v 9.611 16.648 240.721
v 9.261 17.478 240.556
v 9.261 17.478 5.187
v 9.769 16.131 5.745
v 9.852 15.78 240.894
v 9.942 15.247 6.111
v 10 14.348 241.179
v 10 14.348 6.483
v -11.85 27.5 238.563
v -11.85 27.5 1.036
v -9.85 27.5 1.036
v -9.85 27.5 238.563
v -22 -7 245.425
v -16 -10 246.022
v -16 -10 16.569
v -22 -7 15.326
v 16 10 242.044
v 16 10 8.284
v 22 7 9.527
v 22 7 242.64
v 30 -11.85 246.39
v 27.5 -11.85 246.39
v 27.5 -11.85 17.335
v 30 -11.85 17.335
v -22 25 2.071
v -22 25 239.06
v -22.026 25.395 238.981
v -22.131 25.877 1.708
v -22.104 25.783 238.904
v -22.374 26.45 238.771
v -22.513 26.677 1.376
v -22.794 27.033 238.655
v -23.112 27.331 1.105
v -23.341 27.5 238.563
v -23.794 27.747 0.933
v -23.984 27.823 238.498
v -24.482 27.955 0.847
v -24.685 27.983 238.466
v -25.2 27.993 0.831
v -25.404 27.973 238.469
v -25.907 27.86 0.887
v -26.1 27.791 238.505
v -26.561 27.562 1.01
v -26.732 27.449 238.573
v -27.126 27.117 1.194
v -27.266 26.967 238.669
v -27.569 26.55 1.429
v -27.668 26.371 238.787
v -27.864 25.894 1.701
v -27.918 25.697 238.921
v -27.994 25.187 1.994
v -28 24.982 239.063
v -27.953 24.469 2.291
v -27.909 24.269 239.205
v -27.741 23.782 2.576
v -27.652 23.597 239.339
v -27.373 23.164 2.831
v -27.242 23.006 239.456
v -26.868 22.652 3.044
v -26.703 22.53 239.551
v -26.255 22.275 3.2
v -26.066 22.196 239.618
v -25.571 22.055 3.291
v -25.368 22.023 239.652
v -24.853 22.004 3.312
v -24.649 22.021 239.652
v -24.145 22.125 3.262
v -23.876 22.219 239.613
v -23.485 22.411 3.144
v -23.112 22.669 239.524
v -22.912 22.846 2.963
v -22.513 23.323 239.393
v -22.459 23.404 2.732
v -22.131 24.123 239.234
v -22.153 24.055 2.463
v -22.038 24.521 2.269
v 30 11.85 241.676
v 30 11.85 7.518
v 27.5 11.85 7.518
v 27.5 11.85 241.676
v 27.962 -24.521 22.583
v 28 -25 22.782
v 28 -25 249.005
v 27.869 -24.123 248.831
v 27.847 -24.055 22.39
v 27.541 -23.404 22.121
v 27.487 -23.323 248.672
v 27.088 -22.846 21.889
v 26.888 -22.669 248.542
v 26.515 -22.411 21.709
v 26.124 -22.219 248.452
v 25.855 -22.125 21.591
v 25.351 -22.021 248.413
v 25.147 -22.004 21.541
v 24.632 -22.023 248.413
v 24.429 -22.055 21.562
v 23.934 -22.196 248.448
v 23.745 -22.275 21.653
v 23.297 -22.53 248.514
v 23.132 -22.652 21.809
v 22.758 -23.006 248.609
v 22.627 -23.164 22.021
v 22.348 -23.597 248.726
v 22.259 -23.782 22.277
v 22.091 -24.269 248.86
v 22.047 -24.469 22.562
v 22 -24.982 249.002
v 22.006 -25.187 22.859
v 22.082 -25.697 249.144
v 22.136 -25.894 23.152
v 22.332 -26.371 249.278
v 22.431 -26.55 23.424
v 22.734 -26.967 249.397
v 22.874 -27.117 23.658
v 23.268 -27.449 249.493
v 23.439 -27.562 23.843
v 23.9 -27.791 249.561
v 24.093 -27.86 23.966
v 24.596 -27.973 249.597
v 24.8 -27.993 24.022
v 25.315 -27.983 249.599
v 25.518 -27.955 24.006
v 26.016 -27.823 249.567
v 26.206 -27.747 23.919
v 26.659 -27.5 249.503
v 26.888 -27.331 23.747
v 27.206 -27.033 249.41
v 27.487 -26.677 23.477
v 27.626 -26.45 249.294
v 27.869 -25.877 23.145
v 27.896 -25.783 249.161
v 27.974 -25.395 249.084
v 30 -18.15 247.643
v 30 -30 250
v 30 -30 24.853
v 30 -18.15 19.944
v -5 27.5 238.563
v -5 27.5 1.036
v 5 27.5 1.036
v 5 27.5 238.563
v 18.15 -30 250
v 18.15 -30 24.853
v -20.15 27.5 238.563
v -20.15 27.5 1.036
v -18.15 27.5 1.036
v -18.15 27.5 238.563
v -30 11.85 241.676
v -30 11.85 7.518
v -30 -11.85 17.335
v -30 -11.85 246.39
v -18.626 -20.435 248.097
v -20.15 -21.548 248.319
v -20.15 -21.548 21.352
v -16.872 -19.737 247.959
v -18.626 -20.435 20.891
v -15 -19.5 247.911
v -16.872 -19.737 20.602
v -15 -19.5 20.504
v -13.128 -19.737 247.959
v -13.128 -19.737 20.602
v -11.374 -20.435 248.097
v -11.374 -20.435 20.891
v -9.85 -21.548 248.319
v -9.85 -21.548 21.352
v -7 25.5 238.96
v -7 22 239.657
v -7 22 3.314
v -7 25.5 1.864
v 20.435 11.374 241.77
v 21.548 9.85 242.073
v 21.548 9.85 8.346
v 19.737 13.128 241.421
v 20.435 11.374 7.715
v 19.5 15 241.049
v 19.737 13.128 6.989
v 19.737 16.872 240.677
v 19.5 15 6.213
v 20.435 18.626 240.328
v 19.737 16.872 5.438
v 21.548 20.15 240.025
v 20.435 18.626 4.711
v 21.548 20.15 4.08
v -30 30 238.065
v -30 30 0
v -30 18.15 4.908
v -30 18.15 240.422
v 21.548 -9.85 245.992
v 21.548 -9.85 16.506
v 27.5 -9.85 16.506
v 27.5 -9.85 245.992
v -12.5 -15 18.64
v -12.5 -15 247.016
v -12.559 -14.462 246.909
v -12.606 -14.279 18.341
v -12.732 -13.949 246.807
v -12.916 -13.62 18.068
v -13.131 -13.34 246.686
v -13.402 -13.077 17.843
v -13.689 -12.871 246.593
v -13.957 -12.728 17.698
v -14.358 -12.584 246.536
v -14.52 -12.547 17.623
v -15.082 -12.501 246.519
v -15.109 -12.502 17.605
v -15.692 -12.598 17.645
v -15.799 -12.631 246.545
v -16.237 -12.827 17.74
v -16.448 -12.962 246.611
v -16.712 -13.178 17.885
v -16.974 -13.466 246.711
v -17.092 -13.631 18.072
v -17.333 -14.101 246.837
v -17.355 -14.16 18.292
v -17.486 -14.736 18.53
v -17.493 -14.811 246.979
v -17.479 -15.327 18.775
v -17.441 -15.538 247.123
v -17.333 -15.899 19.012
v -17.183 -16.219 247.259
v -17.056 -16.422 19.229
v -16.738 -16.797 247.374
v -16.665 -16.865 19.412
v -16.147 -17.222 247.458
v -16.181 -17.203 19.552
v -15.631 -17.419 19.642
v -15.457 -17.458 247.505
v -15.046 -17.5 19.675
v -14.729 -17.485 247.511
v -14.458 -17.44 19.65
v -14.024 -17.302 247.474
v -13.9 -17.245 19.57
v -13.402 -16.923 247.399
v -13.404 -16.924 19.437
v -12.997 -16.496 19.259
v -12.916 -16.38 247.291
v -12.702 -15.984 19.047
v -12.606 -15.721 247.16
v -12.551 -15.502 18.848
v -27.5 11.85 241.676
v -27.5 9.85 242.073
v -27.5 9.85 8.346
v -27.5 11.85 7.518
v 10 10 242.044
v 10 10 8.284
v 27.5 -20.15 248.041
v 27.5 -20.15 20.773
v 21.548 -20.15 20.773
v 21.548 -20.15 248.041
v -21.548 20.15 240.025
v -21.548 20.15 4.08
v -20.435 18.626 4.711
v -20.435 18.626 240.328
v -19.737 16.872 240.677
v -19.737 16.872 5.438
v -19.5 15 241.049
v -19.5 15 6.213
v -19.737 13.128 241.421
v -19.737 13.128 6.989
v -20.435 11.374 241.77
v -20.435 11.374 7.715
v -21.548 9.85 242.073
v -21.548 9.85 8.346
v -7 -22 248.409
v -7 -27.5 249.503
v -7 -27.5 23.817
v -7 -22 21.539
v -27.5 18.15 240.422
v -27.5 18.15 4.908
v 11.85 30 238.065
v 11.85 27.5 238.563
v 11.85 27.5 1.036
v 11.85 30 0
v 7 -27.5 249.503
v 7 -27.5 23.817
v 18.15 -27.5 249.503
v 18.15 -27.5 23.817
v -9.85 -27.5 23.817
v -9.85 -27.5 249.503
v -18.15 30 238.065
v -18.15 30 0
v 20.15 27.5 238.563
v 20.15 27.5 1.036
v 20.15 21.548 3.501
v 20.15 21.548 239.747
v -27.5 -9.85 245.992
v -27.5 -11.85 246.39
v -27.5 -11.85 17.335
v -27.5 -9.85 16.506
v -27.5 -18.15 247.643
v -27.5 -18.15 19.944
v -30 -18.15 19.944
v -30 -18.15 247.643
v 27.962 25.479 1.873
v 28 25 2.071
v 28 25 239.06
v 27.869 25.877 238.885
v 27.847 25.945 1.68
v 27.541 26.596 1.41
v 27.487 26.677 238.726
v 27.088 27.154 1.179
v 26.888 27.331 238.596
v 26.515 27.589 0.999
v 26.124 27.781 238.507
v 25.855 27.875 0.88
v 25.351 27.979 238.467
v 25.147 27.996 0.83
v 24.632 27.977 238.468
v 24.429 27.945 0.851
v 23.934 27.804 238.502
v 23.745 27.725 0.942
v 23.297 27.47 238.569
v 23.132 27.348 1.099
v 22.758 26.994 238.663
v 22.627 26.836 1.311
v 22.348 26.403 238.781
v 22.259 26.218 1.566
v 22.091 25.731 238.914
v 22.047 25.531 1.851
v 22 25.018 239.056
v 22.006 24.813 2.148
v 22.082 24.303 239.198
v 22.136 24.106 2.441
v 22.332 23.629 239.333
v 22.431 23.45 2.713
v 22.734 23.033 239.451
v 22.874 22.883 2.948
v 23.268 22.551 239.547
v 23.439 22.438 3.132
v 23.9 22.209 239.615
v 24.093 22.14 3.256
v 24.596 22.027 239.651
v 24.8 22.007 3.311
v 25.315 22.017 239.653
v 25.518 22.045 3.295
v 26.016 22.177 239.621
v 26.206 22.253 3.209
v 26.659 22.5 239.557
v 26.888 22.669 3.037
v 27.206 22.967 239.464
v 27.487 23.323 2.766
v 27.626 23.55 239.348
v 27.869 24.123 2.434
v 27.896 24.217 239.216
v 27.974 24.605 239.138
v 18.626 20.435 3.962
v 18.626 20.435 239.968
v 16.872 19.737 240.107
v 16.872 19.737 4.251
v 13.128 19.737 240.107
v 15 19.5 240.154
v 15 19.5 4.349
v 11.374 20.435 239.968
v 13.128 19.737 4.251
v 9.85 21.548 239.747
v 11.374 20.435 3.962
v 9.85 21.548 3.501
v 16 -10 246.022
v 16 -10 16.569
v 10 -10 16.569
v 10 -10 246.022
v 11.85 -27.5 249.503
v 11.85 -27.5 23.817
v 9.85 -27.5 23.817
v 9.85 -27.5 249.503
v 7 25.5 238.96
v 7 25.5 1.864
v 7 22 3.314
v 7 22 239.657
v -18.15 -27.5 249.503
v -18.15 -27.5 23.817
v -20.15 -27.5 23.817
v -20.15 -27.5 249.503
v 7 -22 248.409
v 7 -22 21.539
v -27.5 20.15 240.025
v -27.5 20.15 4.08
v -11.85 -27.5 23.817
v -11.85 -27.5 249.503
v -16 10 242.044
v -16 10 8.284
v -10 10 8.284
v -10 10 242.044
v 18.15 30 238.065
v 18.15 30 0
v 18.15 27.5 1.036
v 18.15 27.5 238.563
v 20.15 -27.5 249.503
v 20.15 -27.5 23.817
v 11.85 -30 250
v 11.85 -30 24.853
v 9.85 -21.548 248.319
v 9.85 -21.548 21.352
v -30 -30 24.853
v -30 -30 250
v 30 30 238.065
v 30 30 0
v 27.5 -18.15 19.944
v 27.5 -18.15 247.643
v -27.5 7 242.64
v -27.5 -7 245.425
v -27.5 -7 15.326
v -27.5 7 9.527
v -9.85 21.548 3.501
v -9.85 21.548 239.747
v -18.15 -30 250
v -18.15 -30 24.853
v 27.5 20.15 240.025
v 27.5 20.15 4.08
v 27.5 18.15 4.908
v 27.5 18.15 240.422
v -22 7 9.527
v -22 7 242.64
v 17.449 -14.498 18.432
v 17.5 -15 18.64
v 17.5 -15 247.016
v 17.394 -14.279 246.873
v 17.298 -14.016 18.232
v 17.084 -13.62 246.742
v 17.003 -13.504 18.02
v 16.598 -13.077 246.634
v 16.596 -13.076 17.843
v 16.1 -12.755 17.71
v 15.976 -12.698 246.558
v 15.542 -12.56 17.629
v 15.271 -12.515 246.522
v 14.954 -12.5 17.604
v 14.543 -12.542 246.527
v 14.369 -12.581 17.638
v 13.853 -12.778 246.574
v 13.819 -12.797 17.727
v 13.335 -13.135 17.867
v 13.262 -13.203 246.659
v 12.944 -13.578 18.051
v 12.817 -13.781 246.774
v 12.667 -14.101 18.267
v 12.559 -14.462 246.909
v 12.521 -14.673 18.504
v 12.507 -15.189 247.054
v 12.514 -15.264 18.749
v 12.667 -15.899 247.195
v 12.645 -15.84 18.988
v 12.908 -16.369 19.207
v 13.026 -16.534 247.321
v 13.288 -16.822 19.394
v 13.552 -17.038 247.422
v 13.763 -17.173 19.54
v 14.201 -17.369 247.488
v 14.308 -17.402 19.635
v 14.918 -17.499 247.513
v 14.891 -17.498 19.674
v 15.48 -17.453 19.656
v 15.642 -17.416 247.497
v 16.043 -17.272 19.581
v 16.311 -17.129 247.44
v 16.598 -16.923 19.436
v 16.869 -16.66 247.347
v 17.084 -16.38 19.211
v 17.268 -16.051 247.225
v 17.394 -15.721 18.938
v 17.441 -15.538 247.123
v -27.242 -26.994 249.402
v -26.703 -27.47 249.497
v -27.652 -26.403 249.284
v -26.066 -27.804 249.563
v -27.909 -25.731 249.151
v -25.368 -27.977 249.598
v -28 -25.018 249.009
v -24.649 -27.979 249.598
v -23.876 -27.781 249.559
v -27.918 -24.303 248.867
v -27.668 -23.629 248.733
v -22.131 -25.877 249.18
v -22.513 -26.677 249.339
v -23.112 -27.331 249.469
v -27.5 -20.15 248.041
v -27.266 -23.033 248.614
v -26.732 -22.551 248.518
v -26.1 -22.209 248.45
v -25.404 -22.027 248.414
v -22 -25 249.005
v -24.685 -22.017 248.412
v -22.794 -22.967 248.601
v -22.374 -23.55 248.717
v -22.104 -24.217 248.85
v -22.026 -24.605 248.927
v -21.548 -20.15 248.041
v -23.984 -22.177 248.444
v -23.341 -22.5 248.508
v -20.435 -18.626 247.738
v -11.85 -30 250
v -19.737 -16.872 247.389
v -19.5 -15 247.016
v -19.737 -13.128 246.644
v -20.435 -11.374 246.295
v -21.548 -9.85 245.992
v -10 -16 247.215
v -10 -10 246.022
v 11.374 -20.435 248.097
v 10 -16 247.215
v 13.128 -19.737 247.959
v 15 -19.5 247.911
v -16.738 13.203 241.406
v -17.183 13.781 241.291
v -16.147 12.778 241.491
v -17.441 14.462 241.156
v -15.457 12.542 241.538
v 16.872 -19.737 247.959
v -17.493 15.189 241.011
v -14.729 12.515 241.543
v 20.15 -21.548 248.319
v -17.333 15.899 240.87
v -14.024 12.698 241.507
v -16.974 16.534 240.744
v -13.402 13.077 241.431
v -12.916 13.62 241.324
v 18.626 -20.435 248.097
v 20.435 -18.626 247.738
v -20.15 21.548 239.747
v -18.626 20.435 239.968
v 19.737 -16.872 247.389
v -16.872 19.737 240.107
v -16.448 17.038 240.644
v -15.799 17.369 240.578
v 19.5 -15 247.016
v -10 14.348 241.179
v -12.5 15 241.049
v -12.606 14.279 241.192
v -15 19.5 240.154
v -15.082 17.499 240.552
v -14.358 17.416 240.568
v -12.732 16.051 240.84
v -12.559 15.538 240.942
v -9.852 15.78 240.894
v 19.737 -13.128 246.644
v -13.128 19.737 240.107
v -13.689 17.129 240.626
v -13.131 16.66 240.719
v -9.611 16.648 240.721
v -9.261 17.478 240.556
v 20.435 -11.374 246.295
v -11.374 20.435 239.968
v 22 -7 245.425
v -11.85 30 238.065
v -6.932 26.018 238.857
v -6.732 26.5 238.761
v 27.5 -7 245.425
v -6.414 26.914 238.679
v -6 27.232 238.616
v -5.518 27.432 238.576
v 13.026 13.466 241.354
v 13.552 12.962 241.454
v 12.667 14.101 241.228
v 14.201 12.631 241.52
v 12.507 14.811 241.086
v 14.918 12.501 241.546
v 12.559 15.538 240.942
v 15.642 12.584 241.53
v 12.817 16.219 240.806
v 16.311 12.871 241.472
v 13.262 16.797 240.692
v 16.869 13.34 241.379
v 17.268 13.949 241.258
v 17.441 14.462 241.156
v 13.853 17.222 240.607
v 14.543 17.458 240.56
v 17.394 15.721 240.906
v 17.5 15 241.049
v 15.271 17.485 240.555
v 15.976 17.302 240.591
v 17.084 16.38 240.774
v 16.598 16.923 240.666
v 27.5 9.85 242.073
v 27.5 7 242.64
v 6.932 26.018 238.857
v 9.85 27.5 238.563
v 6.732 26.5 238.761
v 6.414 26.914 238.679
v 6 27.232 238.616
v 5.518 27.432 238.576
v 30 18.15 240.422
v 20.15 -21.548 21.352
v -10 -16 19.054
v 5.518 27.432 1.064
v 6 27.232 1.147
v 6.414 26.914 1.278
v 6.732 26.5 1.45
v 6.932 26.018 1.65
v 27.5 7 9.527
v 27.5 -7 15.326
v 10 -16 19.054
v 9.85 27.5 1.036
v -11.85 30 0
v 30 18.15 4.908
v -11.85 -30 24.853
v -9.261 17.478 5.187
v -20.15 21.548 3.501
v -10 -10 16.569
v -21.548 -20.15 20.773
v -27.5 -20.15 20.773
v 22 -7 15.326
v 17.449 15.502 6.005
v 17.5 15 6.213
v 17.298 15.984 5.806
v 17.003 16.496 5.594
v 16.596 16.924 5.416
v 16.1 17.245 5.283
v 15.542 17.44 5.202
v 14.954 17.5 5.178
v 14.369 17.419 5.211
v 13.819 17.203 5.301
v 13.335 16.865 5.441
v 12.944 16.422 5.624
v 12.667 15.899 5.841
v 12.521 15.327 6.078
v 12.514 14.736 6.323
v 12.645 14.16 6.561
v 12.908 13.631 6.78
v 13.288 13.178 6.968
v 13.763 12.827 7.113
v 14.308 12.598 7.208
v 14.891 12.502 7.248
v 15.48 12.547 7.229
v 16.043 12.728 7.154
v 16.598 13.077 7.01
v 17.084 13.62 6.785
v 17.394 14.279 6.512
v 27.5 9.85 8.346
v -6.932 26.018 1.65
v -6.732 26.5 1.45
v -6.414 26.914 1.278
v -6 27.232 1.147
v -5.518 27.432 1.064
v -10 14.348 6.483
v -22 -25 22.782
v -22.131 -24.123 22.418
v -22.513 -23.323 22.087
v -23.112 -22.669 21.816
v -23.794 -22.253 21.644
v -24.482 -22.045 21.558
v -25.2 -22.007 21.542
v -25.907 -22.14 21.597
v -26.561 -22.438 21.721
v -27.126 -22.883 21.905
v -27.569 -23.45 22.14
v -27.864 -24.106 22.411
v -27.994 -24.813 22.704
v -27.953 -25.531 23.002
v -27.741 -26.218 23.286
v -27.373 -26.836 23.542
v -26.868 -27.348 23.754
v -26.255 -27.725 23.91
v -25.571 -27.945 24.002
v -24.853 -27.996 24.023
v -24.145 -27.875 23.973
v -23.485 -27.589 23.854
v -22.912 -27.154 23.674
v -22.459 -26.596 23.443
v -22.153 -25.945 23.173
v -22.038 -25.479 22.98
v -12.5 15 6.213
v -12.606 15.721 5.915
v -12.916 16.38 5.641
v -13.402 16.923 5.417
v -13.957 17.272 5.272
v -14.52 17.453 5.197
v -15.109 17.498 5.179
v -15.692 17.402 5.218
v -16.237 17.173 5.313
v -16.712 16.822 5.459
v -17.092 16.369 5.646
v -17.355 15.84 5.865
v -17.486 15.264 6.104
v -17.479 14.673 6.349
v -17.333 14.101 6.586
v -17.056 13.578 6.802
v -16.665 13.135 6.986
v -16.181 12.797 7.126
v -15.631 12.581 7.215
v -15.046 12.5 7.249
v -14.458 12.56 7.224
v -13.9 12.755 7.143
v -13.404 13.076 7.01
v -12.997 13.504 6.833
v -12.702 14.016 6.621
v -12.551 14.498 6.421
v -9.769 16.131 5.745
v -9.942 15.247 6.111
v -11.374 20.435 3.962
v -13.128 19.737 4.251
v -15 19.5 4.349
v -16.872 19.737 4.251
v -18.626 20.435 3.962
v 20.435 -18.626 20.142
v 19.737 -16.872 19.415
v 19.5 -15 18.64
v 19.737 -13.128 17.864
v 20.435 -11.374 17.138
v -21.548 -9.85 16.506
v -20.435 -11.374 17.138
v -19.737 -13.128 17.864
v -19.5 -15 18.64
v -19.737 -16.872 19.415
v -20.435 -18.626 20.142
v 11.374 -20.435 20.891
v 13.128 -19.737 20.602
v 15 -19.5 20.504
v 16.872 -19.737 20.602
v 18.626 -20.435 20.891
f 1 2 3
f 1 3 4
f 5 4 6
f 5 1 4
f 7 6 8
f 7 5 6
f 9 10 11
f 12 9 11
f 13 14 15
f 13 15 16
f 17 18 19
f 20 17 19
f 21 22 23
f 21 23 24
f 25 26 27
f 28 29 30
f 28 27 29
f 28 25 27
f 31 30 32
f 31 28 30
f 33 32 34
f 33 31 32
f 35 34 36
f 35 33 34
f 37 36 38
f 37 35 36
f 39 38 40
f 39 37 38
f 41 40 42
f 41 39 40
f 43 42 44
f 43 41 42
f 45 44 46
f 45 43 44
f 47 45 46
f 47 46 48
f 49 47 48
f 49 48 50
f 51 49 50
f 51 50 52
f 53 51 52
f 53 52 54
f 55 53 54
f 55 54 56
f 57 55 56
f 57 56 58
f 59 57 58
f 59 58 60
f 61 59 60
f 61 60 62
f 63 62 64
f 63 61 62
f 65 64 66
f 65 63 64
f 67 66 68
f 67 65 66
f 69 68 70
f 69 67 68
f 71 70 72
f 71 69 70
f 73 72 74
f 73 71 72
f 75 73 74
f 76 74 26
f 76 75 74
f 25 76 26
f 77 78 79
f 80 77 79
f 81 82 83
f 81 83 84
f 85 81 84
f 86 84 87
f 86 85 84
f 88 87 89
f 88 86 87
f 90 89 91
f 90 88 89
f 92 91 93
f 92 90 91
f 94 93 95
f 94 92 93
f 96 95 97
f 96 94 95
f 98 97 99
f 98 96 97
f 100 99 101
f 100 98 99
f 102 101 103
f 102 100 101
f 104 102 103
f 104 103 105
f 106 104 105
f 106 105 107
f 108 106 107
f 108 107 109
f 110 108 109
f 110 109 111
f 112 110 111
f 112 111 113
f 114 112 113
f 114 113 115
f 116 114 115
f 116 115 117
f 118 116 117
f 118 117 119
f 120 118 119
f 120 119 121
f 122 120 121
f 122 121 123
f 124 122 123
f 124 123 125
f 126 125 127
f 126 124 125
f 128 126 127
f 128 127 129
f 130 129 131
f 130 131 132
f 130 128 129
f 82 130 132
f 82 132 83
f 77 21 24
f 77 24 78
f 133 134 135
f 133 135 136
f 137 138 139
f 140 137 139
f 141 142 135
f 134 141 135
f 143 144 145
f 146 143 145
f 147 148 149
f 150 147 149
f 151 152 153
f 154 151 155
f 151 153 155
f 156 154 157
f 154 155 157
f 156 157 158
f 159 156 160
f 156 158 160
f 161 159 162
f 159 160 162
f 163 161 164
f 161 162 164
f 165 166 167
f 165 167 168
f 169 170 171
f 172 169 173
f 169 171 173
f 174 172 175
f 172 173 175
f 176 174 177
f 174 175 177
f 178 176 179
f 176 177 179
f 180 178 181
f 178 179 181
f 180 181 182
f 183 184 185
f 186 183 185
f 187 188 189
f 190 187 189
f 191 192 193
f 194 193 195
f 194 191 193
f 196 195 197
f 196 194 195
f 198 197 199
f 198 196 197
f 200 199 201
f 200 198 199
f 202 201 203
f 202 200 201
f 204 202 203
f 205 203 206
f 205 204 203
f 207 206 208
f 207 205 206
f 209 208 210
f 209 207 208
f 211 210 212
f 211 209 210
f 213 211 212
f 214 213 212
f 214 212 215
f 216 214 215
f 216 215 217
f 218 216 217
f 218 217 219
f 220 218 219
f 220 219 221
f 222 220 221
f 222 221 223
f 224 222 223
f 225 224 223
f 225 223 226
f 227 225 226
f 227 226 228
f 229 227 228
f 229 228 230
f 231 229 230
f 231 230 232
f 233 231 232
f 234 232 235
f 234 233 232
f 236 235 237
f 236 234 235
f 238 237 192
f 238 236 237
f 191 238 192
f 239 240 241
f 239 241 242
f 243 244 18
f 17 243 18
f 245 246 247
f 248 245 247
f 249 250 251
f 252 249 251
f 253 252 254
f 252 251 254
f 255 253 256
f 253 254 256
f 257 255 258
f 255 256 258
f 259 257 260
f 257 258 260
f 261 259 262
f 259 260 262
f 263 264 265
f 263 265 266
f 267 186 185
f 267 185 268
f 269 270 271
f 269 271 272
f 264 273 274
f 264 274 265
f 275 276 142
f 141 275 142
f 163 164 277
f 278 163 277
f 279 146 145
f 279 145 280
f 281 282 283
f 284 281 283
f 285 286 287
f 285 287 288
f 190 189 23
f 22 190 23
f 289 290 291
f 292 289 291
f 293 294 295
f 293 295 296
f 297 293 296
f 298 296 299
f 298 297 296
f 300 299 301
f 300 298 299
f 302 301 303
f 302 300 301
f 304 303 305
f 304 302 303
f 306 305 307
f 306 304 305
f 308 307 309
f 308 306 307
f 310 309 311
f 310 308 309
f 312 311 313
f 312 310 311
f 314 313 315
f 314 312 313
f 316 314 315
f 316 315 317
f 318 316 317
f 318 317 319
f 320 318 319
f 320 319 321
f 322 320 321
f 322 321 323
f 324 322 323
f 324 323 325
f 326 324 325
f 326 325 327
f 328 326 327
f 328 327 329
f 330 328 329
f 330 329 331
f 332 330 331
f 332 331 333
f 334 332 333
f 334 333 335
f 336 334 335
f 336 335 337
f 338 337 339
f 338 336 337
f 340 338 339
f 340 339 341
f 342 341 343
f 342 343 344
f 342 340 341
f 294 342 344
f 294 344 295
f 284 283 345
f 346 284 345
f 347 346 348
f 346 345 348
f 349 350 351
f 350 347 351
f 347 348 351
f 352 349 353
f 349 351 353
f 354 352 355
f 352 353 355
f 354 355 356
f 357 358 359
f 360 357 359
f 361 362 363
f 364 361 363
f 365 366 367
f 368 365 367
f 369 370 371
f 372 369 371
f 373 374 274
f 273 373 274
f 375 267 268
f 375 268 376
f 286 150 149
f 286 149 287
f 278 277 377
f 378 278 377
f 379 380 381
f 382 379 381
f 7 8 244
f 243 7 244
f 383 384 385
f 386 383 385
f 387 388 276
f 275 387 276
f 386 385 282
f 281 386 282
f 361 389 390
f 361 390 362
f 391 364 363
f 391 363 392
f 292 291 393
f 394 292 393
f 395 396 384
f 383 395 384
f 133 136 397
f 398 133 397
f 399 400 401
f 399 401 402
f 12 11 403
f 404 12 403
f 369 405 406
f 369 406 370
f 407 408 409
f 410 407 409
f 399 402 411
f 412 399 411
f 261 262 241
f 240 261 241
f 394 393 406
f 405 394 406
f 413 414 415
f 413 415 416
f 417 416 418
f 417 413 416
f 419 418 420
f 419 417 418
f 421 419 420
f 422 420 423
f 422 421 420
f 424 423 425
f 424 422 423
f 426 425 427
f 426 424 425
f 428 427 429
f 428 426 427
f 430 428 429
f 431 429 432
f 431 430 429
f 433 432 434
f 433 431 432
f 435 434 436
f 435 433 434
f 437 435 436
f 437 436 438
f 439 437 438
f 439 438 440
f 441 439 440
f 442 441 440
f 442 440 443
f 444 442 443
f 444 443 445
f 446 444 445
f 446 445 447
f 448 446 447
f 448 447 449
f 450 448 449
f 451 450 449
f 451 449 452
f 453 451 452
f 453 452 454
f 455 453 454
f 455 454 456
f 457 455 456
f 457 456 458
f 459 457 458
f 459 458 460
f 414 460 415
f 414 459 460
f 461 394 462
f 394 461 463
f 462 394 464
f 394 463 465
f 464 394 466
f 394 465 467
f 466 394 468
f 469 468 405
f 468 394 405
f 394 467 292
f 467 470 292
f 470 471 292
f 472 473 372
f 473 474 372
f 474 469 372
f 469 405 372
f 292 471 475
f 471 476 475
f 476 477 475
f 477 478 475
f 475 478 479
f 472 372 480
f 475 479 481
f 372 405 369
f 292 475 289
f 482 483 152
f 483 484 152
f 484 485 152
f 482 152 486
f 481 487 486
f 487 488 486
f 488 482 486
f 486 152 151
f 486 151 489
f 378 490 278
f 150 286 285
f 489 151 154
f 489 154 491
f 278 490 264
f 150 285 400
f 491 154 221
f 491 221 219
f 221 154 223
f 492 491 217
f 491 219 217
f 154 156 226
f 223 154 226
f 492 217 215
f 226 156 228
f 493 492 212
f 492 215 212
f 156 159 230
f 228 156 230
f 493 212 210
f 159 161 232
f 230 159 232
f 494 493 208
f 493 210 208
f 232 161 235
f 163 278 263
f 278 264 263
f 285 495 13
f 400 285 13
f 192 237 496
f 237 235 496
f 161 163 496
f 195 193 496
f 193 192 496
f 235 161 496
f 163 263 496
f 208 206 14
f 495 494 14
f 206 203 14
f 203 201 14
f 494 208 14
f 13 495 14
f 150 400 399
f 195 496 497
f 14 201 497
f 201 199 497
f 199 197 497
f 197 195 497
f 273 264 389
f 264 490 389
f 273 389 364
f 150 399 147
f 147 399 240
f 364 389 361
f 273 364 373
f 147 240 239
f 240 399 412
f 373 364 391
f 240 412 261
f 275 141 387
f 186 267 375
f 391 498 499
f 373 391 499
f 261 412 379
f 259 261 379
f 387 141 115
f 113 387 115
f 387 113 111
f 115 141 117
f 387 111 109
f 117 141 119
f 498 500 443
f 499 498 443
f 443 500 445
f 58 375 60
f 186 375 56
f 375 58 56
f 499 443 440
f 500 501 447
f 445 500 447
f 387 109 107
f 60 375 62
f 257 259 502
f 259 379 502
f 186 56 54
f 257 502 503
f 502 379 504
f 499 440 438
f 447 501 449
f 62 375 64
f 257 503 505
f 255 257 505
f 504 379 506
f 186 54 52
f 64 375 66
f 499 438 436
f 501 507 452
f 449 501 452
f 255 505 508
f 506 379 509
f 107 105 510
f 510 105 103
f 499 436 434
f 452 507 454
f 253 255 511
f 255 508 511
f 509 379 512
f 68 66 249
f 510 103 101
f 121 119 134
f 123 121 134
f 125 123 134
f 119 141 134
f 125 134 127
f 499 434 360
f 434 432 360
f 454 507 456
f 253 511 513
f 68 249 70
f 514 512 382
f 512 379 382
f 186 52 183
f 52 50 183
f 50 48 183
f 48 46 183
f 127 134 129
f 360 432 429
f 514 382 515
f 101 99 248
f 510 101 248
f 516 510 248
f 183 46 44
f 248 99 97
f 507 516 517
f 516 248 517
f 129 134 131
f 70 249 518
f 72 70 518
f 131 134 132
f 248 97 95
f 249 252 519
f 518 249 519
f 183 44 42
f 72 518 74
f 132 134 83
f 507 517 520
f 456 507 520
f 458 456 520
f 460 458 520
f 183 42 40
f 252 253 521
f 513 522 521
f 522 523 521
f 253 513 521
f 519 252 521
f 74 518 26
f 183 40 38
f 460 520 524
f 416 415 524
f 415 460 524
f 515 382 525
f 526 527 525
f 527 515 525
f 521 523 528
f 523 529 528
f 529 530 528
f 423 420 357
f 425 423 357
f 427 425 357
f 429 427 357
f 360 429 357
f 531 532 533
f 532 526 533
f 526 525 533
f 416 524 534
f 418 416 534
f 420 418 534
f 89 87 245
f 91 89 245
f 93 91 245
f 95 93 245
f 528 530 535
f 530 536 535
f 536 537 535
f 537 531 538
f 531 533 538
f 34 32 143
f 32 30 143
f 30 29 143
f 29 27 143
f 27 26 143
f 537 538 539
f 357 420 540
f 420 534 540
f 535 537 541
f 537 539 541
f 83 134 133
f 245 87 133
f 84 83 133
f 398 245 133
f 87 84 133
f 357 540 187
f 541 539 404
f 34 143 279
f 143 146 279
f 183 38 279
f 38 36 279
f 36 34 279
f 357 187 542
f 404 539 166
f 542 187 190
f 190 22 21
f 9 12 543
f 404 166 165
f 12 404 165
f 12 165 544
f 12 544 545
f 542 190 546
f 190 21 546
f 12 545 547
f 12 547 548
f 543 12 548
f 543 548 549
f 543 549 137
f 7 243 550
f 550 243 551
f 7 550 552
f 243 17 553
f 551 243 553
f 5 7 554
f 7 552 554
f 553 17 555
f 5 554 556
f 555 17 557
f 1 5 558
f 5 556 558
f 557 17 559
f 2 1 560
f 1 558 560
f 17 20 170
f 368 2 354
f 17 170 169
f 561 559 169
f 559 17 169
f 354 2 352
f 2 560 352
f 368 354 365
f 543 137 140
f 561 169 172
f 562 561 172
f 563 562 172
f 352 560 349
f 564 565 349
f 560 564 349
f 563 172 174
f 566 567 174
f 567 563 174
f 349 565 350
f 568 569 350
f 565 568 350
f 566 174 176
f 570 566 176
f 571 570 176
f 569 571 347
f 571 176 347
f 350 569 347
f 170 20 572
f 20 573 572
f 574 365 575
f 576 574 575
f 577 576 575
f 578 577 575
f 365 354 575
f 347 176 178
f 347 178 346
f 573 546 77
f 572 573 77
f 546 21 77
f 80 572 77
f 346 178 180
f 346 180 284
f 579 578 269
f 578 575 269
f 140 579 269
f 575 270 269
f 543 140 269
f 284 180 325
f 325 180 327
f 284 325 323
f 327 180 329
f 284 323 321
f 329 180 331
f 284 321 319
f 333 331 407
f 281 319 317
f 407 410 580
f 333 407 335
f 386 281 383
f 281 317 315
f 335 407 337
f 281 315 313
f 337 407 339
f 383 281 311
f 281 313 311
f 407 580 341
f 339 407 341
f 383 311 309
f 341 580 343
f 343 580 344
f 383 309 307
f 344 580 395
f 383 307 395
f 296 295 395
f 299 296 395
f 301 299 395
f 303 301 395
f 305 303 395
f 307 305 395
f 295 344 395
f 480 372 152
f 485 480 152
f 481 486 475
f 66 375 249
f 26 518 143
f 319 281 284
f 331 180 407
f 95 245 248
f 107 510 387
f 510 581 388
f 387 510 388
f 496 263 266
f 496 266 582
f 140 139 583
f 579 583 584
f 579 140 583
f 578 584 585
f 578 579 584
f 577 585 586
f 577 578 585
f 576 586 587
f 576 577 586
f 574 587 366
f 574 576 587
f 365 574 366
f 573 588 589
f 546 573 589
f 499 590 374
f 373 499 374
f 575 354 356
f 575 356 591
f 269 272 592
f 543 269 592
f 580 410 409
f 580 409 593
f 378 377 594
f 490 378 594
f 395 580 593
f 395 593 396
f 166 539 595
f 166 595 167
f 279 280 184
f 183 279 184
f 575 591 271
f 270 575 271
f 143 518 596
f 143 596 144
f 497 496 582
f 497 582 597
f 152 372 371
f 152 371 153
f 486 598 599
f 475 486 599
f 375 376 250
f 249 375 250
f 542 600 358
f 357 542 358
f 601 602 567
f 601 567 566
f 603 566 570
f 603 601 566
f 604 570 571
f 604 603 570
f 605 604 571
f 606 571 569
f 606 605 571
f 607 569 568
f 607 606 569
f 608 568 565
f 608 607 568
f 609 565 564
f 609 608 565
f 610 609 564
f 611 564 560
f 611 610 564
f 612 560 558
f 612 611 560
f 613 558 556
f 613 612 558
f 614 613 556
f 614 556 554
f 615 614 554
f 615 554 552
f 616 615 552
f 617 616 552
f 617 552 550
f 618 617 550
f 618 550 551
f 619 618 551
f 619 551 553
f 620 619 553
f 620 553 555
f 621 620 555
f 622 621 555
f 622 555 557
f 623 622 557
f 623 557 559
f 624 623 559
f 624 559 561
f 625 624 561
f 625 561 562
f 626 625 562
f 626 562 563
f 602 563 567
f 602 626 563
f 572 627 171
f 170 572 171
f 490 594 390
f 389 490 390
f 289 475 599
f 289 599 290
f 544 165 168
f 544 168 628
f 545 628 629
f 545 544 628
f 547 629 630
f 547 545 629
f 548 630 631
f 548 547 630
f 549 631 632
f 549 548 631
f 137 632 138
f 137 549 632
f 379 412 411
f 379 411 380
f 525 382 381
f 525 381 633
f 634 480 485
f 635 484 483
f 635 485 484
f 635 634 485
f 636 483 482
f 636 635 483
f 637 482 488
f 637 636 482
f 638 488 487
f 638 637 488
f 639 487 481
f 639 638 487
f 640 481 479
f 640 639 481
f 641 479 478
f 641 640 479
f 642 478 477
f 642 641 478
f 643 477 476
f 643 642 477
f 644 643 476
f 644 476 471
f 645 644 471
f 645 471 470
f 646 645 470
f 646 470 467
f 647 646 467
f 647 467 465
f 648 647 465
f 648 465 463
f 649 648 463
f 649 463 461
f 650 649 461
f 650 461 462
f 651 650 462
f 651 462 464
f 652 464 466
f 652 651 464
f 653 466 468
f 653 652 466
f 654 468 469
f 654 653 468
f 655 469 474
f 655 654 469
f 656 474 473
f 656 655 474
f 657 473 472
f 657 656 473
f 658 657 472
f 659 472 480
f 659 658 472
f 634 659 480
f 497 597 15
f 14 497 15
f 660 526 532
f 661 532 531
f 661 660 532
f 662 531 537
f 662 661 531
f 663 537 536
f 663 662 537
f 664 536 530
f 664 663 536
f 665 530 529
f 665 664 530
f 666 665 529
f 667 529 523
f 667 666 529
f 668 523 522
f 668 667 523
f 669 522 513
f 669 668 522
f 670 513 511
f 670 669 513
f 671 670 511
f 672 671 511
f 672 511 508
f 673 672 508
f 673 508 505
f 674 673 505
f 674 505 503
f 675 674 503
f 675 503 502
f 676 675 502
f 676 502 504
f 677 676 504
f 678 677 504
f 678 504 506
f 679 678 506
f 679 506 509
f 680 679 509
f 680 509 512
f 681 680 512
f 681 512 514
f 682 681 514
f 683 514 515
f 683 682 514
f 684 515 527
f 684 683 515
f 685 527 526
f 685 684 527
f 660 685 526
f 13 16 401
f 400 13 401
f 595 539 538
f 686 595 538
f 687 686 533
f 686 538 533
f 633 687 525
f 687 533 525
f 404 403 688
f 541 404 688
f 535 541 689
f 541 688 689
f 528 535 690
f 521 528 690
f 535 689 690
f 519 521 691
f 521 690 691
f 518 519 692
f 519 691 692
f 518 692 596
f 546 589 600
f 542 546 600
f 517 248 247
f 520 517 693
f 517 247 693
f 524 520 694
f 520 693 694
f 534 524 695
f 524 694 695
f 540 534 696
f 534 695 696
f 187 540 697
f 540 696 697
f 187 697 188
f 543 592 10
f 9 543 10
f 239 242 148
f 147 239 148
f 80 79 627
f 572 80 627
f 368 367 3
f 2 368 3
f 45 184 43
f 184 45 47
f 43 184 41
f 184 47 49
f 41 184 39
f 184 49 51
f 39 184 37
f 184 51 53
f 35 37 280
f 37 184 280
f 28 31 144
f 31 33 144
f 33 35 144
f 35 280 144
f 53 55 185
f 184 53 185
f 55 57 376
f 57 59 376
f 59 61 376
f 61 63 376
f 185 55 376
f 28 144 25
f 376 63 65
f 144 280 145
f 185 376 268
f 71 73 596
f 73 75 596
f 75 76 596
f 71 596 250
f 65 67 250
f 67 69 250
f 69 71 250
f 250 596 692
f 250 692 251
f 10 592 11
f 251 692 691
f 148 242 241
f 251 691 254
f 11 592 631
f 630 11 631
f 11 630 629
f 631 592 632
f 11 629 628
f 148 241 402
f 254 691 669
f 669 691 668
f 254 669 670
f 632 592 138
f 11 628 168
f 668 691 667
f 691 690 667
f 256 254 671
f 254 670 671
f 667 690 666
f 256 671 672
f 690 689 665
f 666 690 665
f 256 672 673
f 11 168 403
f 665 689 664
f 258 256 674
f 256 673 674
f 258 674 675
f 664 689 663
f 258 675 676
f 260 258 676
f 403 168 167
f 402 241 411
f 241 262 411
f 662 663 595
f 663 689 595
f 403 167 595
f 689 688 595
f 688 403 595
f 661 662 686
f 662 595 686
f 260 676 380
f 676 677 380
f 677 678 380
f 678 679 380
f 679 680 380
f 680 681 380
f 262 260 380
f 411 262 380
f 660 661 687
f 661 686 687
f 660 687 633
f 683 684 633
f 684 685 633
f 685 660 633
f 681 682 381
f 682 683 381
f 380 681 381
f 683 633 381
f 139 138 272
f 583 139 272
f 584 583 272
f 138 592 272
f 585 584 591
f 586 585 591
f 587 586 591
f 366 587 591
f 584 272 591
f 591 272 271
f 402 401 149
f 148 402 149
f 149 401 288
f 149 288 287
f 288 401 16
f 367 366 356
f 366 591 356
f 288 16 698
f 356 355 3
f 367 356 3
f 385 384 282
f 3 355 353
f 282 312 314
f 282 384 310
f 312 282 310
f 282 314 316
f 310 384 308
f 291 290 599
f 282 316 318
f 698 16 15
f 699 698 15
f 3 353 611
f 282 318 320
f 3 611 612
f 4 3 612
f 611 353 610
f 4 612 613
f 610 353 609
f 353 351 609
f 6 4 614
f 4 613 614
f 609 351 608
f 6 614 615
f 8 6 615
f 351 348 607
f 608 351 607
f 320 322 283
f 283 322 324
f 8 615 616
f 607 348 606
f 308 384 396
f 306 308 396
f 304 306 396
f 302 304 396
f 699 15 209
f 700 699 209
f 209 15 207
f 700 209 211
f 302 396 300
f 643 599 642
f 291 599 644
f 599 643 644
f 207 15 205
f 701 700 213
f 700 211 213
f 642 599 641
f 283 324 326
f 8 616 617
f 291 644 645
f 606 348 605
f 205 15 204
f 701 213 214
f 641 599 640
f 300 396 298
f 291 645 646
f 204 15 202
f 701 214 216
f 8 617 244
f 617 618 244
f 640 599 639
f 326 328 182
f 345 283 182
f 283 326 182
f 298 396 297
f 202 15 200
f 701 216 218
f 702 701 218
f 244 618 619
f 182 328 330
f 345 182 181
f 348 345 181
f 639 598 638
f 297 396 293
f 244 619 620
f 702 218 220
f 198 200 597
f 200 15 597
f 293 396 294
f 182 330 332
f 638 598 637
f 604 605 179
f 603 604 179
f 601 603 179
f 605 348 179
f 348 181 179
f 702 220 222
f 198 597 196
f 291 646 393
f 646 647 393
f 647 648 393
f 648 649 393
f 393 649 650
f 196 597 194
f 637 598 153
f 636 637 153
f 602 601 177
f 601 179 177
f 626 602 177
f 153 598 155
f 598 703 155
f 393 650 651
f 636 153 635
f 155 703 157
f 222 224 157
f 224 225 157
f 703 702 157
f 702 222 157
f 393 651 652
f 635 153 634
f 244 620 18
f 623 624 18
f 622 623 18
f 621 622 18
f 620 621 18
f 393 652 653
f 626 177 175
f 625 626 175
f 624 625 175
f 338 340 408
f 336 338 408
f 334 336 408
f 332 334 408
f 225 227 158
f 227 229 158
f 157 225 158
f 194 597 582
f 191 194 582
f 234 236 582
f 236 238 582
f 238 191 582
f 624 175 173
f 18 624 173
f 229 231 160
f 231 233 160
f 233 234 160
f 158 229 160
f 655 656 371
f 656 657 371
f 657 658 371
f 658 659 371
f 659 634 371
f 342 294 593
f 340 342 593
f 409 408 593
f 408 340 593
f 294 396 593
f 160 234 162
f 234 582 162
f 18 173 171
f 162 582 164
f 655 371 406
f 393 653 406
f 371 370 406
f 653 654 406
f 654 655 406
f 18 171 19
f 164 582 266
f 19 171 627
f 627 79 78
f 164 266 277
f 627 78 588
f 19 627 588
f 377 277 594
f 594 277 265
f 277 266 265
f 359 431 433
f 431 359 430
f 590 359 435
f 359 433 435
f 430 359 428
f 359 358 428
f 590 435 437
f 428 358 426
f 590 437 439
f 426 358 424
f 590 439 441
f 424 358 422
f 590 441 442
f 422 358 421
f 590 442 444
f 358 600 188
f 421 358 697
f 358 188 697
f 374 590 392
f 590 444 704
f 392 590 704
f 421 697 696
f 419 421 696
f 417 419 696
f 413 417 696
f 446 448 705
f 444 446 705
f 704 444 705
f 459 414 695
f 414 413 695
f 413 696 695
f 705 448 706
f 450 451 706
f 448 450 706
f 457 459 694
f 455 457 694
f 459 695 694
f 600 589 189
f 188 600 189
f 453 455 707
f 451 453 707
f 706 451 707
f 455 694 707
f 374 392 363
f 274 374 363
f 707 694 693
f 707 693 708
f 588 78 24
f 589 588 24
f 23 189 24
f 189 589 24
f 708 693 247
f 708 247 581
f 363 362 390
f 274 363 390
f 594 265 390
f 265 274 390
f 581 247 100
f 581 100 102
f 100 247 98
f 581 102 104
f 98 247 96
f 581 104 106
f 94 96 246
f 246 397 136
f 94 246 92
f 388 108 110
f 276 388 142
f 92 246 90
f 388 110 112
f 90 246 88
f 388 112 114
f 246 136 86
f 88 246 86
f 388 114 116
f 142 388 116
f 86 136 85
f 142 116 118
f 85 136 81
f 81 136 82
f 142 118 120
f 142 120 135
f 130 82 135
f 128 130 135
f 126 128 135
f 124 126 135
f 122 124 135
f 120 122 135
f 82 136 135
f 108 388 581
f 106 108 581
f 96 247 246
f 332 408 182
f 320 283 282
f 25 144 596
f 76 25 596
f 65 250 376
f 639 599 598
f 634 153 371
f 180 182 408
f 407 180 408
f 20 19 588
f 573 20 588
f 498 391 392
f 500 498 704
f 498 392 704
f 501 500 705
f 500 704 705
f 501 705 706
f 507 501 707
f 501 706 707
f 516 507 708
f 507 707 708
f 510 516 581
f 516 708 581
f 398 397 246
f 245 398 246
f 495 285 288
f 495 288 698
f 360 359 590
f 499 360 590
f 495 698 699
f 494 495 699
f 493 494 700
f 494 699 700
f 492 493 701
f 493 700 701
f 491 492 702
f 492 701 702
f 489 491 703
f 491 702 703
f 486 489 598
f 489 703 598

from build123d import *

# Parameters (mm, degrees)
F0_R          = 3
F0_R_2        = 2.5
F1_DEPTH      = 250
F2_R          = 2
F3_R          = 7
F5_DEPTH      = 30
F5_DEPTH_BACK = 30


# Not quite as in the source:
# - a feature names something its author has since deleted; it is built from what else it names


with BuildPart() as f1:
    # F0 (on Top) → F1 (new body)
    with BuildSketch(Plane.XY):
        with BuildLine():
            Line((18.15, -30), (30, -30))
            Line((30, -30), (30, -18.15))
            Line((30, -18.15), (27.5, -18.15))
            Line((27.5, -18.15), (27.5, -20.15))
            Line((27.5, -20.15), (21.5477069044, -20.15))
            ThreePointArc((21.5477069044, -20.15), (19.5, -15), (21.5477069044, -9.85))
            Line((21.5477069044, -9.85), (27.5, -9.85))
            Line((27.5, -9.85), (27.5, -11.85))
            Line((27.5, -11.85), (30, -11.85))
            Line((30, -11.85), (30, 11.85))
            Line((30, 11.85), (27.5, 11.85))
            Line((27.5, 11.85), (27.5, 9.85))
            Line((27.5, 9.85), (21.5477069044, 9.85))
            ThreePointArc((21.5477069044, 9.85), (19.5, 15), (21.5477069044, 20.15))
            Line((21.5477069044, 20.15), (27.5, 20.15))
            Line((27.5, 20.15), (27.5, 18.15))
            Line((27.5, 18.15), (30, 18.15))
            Line((30, 18.15), (30, 30))
            Line((30, 30), (18.15, 30))
            Line((18.15, 30), (18.15, 27.5))
            Line((18.15, 27.5), (20.15, 27.5))
            Line((20.15, 27.5), (20.15, 21.5477069044))
            ThreePointArc((20.15, 21.5477069044), (15, 19.5), (9.85, 21.5477069044))
            Line((9.85, 21.5477069044), (9.85, 27.5))
            Line((9.85, 27.5), (11.85, 27.5))
            Line((11.85, 27.5), (11.85, 30))
            Line((11.85, 30), (-11.85, 30))
            Line((-11.85, 30), (-11.85, 27.5))
            Line((-11.85, 27.5), (-9.85, 27.5))
            Line((-9.85, 27.5), (-9.85, 21.5477069044))
            ThreePointArc((-9.85, 21.5477069044), (-15, 19.5), (-20.15, 21.5477069044))
            Line((-20.15, 21.5477069044), (-20.15, 27.5))
            Line((-20.15, 27.5), (-18.15, 27.5))
            Line((-18.15, 27.5), (-18.15, 30))
            Line((-18.15, 30), (-30, 30))
            Line((-30, 30), (-30, 18.15))
            Line((-30, 18.15), (-27.5, 18.15))
            Line((-27.5, 18.15), (-27.5, 20.15))
            Line((-27.5, 20.15), (-21.5477069044, 20.15))
            ThreePointArc((-21.5477069044, 20.15), (-19.5, 15), (-21.5477069044, 9.85))
            Line((-21.5477069044, 9.85), (-27.5, 9.85))
            Line((-27.5, 9.85), (-27.5, 11.85))
            Line((-27.5, 11.85), (-30, 11.85))
            Line((-30, 11.85), (-30, -11.85))
            Line((-30, -11.85), (-27.5, -11.85))
            Line((-27.5, -11.85), (-27.5, -9.85))
            Line((-27.5, -9.85), (-21.5477069044, -9.85))
            ThreePointArc((-21.5477069044, -9.85), (-19.5, -15), (-21.5477069044, -20.15))
            Line((-21.5477069044, -20.15), (-27.5, -20.15))
            Line((-27.5, -20.15), (-27.5, -18.15))
            Line((-27.5, -18.15), (-30, -18.15))
            Line((-30, -18.15), (-30, -30))
            Line((-30, -30), (-18.15, -30))
            Line((-18.15, -30), (-18.15, -27.5))
            Line((-18.15, -27.5), (-20.15, -27.5))
            Line((-20.15, -27.5), (-20.15, -21.5477069044))
            ThreePointArc((-20.15, -21.5477069044), (-15, -19.5), (-9.85, -21.5477069044))
            Line((-9.85, -21.5477069044), (-9.85, -27.5))
            Line((-9.85, -27.5), (-11.85, -27.5))
            Line((-11.85, -27.5), (-11.85, -30))
            Line((-11.85, -30), (11.85, -30))
            Line((11.85, -30), (11.85, -27.5))
            Line((11.85, -27.5), (9.85, -27.5))
            Line((9.85, -27.5), (9.85, -21.5477069044))
            ThreePointArc((9.85, -21.5477069044), (15, -19.5), (20.15, -21.5477069044))
            Line((20.15, -21.5477069044), (20.15, -27.5))
            Line((20.15, -27.5), (18.15, -27.5))
            Line((18.15, -27.5), (18.15, -30))
        make_face()
        with Locations((-25, -25)):
            Circle(F0_R, mode=Mode.SUBTRACT)
        with Locations((-15, -15)):
            Circle(F0_R_2, mode=Mode.SUBTRACT)
        with Locations((25, -25)):
            Circle(F0_R, mode=Mode.SUBTRACT)
        with Locations((15, -15)):
            Circle(F0_R_2, mode=Mode.SUBTRACT)
        with Locations((-25, 25)):
            Circle(F0_R, mode=Mode.SUBTRACT)
        with Locations((-15, 15)):
            Circle(F0_R_2, mode=Mode.SUBTRACT)
        Polygon((-7, 22), (-7, 27.5), (0, 27.5), (7, 27.5), (7, 22), (10, 16), (10, 10), (16, 10), (22, 7), (27.5, 7), (27.5, 0), (27.5, -7), (22, -7), (16, -10), (10, -10), (10, -16), (7, -22), (7, -27.5), (0, -27.5), (-7, -27.5), (-7, -22), (-10, -16), (-10, -10), (-16, -10), (-22, -7), (-27.5, -7), (-27.5, 0), (-27.5, 7), (-22, 7), (-16, 10), (-10, 10), (-10, 16), align=None, mode=Mode.SUBTRACT)
        with Locations((15, 15)):
            Circle(F0_R_2, mode=Mode.SUBTRACT)
        with Locations((25, 25)):
            Circle(F0_R, mode=Mode.SUBTRACT)
    extrude(amount=F1_DEPTH)

    # F2
    f2_edges = [f1.edges().sort_by_distance(p)[0] for p in [
        (-7, 27.5, 125),
        (7, 27.5, 125),
    ]]
    fillet(f2_edges, radius=F2_R)

    # F3
    f3_edges = [f1.edges().sort_by_distance(p)[0] for p in [
        (-10, 16, 125),
        (10, 16, 125),
    ]]
    fillet(f3_edges, radius=F3_R)

    # F4 (on Right) → F5 (cut, two sides)
    with BuildSketch(Plane.YZ) as f5_sk:
        Polygon((-23.2563562234, -128.5722174771), (30, 0), (-168.5306378236, 82.2340827331), (-221.786994047, -46.338134744), align=None)
        Polygon((171.7491592878, 324.7994275924), (-8.0091289948, 360.5555742708), (-30, 250), (149.7582882826, 214.2438533216), align=None)
    extrude(amount=F5_DEPTH, mode=Mode.SUBTRACT)
    extrude(f5_sk.sketch, amount=-F5_DEPTH_BACK, mode=Mode.SUBTRACT)


solid = f1.part
